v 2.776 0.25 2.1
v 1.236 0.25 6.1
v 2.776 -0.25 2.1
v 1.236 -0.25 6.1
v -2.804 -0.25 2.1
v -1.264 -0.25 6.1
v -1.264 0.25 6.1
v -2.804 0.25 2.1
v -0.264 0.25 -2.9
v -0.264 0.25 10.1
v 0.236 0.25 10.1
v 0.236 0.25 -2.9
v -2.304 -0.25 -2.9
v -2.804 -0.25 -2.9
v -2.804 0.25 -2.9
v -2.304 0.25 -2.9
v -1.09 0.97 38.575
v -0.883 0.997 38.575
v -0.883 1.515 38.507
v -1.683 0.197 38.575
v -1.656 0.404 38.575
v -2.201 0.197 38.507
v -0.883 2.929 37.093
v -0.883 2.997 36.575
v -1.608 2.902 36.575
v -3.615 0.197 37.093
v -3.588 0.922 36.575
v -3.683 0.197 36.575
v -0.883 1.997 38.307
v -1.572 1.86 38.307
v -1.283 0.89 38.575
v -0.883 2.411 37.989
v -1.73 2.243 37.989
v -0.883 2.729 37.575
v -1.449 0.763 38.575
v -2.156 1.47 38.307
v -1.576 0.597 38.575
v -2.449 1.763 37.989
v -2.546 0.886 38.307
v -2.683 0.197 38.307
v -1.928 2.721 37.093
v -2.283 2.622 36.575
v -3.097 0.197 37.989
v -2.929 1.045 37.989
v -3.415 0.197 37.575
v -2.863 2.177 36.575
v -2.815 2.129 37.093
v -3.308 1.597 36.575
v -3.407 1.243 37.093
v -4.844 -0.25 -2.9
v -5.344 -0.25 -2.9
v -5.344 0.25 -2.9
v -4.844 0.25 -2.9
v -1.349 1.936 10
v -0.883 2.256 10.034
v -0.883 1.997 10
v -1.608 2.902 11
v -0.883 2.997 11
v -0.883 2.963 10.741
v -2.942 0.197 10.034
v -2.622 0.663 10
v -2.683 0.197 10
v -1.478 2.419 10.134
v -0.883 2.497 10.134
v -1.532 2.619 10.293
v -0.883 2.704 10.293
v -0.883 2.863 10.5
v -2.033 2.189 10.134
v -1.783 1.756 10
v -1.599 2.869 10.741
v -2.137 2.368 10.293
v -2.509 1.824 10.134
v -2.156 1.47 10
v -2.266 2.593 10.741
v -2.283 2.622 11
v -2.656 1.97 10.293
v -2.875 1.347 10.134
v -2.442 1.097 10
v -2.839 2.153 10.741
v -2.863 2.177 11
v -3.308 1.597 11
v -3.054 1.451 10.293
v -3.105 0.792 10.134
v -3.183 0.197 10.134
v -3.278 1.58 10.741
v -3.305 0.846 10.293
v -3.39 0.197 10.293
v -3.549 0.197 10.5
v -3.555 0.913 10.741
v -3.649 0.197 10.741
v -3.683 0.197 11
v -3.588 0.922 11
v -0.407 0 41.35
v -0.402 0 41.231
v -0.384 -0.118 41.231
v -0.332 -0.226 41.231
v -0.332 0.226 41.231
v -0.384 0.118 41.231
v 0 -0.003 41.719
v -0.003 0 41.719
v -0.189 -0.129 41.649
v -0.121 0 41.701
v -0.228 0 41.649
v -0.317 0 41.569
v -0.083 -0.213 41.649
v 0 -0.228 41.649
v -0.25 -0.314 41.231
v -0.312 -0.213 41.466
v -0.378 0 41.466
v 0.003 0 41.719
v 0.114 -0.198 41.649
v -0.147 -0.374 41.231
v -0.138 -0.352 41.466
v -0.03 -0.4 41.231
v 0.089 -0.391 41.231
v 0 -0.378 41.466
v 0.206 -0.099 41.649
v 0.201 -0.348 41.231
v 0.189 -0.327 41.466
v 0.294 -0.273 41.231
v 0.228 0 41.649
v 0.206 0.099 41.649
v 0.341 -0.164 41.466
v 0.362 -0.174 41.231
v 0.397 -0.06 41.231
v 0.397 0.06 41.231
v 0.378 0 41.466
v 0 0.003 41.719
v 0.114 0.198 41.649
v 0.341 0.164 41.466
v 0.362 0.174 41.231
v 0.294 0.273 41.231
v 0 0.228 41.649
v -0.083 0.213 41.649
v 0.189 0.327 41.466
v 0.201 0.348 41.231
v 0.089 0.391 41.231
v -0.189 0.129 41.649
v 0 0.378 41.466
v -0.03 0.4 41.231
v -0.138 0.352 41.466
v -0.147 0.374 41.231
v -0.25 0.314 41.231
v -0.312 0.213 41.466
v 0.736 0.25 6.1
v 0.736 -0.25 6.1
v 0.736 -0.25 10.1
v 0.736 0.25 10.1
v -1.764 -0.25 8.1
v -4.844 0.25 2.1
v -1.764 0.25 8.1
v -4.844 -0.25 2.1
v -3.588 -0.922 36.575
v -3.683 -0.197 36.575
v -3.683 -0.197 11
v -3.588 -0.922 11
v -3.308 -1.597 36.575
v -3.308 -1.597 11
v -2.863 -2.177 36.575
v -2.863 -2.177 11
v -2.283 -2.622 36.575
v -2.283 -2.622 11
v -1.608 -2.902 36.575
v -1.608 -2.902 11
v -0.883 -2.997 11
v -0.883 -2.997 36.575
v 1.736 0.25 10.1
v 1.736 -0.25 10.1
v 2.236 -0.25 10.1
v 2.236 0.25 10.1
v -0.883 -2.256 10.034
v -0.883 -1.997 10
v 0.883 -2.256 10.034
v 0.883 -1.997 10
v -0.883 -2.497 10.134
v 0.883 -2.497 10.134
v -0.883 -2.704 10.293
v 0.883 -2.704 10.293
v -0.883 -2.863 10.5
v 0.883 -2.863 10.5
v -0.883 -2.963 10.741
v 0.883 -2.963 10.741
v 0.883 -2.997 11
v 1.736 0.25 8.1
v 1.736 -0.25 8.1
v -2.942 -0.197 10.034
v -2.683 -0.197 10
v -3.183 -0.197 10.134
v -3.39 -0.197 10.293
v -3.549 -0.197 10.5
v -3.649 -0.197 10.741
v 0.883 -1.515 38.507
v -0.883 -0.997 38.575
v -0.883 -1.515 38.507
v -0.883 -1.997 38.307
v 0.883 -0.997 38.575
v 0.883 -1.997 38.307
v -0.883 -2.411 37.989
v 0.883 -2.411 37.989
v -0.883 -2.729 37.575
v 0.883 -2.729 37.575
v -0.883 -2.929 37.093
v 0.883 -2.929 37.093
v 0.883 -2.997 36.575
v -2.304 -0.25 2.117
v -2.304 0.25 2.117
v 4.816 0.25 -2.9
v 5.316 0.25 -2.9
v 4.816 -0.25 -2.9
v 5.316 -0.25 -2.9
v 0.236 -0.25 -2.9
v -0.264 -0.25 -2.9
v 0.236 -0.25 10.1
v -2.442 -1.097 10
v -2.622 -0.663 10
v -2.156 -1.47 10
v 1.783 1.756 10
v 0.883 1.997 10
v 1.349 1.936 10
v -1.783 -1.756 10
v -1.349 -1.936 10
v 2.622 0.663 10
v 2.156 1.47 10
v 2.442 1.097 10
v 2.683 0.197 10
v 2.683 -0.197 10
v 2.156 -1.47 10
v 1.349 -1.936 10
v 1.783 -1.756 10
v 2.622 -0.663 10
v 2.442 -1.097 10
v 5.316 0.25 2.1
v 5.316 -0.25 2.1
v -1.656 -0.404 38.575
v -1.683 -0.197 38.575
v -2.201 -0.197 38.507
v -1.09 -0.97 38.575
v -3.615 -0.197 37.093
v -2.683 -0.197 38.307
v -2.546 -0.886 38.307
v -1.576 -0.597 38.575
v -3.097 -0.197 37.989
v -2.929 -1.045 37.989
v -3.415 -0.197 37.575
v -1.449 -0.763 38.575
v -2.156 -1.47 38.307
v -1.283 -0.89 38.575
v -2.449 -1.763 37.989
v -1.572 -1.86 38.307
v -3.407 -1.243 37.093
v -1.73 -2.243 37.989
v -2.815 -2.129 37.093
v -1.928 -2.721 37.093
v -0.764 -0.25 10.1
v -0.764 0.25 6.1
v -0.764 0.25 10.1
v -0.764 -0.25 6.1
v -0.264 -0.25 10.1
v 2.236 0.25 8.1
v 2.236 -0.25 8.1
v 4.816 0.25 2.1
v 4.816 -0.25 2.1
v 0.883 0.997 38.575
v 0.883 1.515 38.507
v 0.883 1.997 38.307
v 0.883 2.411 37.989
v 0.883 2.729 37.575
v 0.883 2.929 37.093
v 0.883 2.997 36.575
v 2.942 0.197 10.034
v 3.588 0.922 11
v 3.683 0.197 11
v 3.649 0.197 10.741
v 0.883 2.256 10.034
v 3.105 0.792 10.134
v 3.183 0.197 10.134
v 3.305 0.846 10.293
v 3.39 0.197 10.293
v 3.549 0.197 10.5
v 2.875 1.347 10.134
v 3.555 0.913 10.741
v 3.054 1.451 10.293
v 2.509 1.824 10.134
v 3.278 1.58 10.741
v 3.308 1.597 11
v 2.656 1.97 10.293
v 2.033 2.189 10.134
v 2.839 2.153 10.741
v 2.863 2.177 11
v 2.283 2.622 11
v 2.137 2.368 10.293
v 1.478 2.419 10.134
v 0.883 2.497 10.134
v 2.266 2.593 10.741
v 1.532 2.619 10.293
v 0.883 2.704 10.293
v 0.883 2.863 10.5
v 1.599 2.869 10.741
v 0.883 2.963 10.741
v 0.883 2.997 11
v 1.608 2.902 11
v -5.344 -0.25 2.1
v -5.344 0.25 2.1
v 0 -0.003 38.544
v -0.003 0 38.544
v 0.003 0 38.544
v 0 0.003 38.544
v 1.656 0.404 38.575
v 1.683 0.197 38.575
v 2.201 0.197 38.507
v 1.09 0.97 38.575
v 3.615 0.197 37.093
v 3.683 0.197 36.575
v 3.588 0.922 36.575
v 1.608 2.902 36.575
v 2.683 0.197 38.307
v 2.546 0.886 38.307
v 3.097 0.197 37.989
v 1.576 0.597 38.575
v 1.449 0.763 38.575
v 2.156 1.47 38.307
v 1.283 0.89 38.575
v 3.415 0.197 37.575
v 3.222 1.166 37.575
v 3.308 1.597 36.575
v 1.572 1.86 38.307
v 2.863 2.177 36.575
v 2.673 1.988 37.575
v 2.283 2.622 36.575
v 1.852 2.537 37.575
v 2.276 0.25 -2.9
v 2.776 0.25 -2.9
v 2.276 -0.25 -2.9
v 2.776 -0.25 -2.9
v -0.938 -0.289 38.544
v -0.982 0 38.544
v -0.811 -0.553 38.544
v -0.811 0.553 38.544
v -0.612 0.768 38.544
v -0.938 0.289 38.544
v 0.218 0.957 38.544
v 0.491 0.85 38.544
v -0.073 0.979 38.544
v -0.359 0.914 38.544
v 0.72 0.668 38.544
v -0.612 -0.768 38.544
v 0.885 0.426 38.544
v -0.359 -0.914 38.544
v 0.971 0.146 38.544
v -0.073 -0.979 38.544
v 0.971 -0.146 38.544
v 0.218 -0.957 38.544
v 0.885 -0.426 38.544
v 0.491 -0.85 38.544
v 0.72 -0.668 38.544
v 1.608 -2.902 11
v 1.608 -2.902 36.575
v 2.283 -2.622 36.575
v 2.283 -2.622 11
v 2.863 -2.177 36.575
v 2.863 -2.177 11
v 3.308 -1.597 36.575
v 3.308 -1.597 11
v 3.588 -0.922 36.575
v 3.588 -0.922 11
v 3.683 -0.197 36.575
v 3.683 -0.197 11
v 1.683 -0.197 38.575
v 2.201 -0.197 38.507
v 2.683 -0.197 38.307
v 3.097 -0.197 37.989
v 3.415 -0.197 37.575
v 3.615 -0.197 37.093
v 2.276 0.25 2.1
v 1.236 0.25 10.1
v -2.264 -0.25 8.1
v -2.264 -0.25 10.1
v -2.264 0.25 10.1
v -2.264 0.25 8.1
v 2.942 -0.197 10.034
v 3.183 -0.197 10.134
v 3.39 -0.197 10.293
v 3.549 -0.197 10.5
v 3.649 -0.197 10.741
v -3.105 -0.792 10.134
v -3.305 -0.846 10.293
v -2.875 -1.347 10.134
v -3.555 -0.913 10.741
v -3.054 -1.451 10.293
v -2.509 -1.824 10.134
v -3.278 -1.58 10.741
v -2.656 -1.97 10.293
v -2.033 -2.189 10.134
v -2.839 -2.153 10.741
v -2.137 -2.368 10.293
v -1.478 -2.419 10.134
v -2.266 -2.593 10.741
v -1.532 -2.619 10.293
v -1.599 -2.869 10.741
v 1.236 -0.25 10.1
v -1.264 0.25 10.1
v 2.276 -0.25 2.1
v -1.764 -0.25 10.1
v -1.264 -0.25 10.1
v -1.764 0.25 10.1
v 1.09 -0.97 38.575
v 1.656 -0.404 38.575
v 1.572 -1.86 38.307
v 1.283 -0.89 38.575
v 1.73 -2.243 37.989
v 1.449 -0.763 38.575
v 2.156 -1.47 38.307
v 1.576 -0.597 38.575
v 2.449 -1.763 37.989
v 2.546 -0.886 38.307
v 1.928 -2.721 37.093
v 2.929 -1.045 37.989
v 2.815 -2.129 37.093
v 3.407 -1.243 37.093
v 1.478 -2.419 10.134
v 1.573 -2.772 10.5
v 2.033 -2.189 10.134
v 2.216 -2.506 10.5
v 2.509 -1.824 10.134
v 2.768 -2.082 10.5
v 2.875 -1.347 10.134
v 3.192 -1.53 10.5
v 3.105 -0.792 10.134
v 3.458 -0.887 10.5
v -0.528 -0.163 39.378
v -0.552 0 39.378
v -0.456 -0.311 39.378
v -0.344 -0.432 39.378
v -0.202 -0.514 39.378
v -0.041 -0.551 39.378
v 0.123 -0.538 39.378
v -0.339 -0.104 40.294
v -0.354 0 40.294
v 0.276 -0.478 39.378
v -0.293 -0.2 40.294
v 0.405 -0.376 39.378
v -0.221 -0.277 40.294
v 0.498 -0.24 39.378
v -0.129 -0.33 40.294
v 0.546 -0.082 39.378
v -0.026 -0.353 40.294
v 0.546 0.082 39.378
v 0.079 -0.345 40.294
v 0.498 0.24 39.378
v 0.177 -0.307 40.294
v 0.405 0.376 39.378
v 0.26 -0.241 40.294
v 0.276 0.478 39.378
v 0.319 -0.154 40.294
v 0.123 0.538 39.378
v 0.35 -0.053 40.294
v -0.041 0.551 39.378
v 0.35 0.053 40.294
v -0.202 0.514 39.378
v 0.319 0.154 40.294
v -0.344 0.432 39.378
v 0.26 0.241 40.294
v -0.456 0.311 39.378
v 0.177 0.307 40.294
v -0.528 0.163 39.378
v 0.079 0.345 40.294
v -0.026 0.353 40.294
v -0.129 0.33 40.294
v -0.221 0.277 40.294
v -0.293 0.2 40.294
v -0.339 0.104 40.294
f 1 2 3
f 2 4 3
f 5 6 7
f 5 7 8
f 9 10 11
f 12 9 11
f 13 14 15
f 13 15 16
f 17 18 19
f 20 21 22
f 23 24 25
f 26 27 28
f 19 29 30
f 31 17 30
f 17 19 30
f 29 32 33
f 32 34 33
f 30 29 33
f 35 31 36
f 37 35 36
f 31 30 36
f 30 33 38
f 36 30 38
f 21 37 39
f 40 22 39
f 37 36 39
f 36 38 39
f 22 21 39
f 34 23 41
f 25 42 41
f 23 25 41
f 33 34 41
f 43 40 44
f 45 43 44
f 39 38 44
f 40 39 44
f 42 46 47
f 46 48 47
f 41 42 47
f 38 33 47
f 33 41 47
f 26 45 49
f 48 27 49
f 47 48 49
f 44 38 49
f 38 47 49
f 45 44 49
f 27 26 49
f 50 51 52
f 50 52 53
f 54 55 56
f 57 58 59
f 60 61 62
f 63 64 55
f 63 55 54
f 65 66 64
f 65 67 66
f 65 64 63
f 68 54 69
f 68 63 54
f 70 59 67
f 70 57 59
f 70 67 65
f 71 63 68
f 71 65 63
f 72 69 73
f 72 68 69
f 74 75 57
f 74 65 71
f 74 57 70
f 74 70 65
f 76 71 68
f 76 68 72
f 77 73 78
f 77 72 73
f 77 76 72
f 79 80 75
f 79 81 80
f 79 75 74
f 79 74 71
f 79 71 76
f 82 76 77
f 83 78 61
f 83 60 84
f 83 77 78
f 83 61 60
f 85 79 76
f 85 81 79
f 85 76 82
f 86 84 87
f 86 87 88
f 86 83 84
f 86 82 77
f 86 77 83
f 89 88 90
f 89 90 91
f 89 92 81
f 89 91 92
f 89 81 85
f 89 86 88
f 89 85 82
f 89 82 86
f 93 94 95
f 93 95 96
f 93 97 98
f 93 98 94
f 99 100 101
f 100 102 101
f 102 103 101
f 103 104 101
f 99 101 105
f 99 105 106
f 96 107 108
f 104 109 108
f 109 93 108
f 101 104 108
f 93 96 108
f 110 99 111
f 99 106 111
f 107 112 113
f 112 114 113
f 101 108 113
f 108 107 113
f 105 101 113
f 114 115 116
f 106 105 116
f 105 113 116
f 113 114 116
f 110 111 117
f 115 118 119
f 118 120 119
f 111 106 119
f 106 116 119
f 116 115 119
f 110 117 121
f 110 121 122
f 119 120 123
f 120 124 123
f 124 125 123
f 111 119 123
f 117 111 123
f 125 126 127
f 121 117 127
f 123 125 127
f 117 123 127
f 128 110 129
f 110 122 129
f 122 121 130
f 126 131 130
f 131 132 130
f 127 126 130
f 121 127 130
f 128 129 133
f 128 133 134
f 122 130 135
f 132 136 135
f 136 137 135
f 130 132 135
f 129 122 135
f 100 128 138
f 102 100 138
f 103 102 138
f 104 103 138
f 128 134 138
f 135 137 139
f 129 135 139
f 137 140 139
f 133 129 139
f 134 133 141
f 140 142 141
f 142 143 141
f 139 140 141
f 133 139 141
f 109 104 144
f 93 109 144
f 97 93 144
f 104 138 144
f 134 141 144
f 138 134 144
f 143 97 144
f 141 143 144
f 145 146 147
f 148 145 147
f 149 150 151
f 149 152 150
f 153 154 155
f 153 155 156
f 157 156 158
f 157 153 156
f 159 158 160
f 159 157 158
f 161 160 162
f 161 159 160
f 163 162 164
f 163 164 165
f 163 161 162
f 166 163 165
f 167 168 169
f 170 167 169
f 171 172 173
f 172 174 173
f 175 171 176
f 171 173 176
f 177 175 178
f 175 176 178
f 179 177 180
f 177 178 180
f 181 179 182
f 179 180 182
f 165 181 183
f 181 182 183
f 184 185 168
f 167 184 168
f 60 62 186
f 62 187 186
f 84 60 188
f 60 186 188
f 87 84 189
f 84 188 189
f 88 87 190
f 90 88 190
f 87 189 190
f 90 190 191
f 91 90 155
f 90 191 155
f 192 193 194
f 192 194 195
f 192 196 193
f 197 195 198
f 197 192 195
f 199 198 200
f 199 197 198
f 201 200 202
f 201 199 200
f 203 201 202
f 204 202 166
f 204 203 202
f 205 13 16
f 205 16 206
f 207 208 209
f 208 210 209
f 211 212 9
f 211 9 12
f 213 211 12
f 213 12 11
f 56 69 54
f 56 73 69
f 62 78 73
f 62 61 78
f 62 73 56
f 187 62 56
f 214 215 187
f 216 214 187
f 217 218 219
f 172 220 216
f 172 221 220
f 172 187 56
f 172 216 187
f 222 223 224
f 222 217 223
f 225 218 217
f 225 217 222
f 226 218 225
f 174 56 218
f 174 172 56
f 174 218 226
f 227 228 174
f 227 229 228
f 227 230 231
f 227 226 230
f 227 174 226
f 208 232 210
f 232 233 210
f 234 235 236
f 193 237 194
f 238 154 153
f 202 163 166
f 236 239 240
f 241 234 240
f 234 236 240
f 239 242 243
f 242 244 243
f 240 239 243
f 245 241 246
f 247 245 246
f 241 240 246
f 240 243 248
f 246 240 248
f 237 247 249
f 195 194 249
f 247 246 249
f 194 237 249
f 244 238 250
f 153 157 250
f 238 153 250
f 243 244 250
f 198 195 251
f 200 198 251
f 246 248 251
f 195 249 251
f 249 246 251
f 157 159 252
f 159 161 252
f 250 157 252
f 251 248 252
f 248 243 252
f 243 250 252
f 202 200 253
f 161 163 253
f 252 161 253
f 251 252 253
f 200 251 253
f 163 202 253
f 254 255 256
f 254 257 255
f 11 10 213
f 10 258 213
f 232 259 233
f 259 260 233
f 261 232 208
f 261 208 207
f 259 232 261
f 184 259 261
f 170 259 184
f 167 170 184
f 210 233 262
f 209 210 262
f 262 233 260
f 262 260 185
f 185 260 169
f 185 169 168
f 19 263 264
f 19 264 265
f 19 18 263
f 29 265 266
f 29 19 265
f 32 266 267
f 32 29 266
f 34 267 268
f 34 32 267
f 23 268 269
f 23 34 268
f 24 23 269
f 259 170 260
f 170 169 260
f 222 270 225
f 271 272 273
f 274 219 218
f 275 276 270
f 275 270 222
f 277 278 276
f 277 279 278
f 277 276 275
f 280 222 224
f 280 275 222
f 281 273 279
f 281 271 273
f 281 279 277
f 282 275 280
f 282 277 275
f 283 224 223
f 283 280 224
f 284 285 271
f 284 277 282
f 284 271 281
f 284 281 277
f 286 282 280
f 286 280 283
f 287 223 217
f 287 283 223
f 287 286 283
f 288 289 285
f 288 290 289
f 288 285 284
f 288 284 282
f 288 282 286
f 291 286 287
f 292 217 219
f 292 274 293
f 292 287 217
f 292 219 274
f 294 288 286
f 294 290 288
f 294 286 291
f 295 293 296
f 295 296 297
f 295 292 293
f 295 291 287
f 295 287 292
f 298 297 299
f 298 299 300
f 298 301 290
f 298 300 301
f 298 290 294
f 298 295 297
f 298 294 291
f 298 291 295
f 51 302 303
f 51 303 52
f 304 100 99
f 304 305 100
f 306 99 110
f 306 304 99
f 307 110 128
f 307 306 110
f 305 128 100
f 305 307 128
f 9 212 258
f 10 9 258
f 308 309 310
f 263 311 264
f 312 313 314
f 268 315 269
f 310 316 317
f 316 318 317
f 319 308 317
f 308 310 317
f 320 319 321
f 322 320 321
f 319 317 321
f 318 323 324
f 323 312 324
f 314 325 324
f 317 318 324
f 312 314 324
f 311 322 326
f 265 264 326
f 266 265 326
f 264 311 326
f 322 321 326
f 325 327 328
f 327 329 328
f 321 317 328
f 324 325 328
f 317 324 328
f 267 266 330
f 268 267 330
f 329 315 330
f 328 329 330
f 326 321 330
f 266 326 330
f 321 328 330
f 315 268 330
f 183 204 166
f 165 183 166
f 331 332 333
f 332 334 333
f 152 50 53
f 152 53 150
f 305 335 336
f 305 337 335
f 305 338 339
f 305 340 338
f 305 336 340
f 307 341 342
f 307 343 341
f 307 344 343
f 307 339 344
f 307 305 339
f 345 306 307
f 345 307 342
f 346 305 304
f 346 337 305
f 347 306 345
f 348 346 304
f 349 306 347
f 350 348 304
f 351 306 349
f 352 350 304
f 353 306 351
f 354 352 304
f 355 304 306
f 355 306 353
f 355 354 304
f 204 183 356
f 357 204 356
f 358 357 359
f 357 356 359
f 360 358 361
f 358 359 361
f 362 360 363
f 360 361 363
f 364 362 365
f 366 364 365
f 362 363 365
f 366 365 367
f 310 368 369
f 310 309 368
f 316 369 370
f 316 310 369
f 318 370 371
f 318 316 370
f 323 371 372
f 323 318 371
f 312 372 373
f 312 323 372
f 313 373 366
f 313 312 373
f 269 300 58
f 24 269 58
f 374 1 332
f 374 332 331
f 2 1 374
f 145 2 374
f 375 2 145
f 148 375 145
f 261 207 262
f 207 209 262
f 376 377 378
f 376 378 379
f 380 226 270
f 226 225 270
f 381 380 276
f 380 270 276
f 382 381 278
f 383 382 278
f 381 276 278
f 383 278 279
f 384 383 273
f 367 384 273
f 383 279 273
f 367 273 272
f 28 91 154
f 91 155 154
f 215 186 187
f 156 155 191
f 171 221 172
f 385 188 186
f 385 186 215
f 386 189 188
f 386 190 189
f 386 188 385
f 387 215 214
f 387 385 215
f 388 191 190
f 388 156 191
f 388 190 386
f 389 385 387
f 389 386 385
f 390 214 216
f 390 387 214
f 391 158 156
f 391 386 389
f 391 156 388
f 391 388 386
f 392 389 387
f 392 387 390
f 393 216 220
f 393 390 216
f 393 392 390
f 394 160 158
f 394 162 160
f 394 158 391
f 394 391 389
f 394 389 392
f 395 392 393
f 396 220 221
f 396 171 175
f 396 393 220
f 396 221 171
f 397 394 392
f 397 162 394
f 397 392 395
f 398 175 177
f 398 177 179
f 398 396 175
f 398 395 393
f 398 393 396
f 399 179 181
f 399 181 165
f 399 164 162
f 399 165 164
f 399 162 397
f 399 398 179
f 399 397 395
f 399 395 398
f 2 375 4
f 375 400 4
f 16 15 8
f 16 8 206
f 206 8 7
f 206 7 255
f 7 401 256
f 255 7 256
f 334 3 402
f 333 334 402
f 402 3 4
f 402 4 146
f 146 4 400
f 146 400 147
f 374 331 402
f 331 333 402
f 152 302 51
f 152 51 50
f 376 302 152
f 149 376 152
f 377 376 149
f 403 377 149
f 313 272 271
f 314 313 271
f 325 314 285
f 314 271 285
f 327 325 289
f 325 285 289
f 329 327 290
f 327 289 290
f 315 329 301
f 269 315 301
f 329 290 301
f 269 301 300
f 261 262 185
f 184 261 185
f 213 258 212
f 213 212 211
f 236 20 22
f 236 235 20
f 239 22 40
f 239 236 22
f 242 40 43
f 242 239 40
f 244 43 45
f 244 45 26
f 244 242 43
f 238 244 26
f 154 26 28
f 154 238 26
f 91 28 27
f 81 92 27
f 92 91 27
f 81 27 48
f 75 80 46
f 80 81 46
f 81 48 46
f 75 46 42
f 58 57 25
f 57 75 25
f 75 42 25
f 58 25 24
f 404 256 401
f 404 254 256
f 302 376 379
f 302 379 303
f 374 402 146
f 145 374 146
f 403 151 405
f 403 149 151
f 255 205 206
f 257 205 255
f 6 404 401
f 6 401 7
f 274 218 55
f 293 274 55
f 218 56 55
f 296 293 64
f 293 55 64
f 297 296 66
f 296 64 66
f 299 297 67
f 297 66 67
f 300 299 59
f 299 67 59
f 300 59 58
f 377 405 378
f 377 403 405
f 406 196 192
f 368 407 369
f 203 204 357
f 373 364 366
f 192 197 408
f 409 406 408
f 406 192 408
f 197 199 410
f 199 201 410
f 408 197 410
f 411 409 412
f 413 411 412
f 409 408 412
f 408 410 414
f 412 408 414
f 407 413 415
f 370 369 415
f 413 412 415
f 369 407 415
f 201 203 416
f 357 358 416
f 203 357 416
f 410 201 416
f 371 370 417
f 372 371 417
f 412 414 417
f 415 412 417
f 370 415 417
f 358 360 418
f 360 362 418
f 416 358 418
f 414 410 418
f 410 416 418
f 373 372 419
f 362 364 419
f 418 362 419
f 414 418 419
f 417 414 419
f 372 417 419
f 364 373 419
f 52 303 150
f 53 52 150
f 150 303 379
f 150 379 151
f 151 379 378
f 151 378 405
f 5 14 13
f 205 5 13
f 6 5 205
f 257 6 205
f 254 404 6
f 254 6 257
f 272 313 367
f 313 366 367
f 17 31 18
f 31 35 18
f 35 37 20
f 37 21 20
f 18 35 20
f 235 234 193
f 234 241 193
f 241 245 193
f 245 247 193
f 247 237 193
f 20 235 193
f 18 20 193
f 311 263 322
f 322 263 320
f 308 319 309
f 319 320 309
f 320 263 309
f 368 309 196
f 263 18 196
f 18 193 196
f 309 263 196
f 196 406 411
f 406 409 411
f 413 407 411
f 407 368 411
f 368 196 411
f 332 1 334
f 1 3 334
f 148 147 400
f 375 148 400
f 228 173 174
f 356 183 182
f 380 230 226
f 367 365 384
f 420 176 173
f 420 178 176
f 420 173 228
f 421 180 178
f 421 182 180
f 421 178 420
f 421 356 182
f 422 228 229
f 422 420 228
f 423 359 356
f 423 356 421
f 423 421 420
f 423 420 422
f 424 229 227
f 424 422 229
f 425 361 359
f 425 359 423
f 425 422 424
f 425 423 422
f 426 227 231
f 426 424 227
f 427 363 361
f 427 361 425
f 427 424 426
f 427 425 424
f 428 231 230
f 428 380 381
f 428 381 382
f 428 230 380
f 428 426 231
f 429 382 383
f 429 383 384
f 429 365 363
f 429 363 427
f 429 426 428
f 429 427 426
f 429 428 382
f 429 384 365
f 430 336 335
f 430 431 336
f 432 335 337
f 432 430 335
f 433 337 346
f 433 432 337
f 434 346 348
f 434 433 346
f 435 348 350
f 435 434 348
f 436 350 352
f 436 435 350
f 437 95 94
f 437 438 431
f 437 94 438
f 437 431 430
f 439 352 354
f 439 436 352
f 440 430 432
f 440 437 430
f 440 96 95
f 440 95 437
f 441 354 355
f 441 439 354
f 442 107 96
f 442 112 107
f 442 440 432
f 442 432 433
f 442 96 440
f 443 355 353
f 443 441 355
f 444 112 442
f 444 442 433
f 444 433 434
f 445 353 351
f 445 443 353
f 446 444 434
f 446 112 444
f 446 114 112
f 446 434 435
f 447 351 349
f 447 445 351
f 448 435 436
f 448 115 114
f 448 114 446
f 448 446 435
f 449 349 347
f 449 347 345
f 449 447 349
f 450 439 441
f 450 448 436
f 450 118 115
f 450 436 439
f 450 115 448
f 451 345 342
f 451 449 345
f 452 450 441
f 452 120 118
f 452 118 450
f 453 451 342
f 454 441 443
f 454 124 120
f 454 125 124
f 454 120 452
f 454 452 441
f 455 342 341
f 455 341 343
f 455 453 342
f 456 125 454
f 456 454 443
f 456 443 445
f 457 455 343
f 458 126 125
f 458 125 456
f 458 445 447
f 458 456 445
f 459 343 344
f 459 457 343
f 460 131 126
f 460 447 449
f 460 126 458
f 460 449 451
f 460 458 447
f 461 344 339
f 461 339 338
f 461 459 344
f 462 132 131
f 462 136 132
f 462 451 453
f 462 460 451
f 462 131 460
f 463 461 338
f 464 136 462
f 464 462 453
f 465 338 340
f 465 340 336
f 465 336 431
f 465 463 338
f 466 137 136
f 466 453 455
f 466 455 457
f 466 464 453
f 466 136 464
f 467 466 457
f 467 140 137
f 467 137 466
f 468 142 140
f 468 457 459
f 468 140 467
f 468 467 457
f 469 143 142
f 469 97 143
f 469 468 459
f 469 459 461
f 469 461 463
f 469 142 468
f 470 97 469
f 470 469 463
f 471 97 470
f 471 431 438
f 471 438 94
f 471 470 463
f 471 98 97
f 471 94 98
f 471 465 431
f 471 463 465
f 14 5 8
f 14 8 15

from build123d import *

# Parameters (mm, degrees)
PAD_DEPTH    = 2.9972
FILLET_R     = 2.8
FILLET001_R  = 2
FILLET002_R  = 1
PAD001_DEPTH = 0.25
PAD002_DEPTH = 0.25
SKETCH004_W  = 0.5
SKETCH004_H  = 13
PAD003_DEPTH = 0.25
PAD004_DEPTH = 0.25
PAD005_DEPTH = 0.25


with BuildPart() as fillet002:
    # Sketch → Pad (new body, symmetric)
    with BuildSketch(Plane.XZ):
        Polygon((-3.683, 10), (-3.683, 38.575), (3.683, 38.575), (3.683, 10), (0, 10), align=None)
    extrude(amount=PAD_DEPTH, both=True)

    # Fillet
    fillet_edges = [fillet002.edges().sort_by_distance(p)[0] for p in [
        (3.683, -2.9972, 24.2875),
        (3.683, 2.9972, 24.2875),
        (-3.683, -2.9972, 24.2875),
        (-3.683, 2.9972, 24.2875),
    ]]
    fillet(fillet_edges, radius=FILLET_R)

    # Fillet001
    fillet001_edges = [fillet002.edges().sort_by_distance(p)[0] for p in [
        (2.862899, 2.177099, 38.575),
        (0, 2.9972, 38.575),
        (-2.862899, 2.177099, 38.575),
        (-2.862899, -2.177099, 38.575),
        (0, -2.9972, 38.575),
        (2.862899, -2.177099, 38.575),
        (3.683, 0, 38.575),
        (-3.683, 0, 38.575),
    ]]
    fillet(fillet001_edges, radius=FILLET001_R)

    # Fillet002
    fillet002_edges = [fillet002.edges().sort_by_distance(p)[0] for p in [
        (2.862899, -2.177099, 10),
        (3.683, 0, 10),
        (2.862899, 2.177099, 10),
        (-0.4415, 2.9972, 10),
        (0.4415, 2.9972, 10),
        (0.4415, -2.9972, 10),
        (-0.4415, -2.9972, 10),
        (-2.862899, -2.177099, 10),
        (-3.683, 0, 10),
        (-2.862899, 2.177099, 10),
    ]]
    fillet(fillet002_edges, radius=FILLET002_R)


with BuildPart() as revolution:
    # Sketch001 → Revolution (revolve)
    with BuildSketch(Plane.XZ):
        with BuildLine():
            ThreePointArc((-0.00252, 41.718762), (-0.316632, 41.568752), (-0.401567, 41.23118))
            ThreePointArc((-0.981911, 38.543762), (-0.423058, 39.82945), (-0.401567, 41.23118))
            Line((-0.00252, 38.543762), (-0.981911, 38.543762))
            Line((-0.00252, 41.718762), (-0.00252, 38.543762))
        make_face()
    revolve(axis=Axis((0, 0, 0), (0, 0, 1)))


with BuildPart() as pad001:
    # Sketch002 → Pad001 (new body, symmetric)
    with BuildSketch(Plane.XZ):
        Polygon((1.736213, 10.1), (2.236213, 10.1), (2.236213, 8.1), (5.316213, 2.1), (5.316213, -2.9), (4.816213, -2.9), (4.816213, 2.1), (1.736213, 8.100001), align=None)
    extrude(amount=PAD001_DEPTH, both=True)


with BuildPart() as pad002:
    # Sketch003 → Pad002 (new body, symmetric)
    with BuildSketch(Plane.XZ):
        Polygon((0.736213, 10.1), (1.236213, 10.1), (1.236213, 6.1), (2.776213, 2.1), (2.776213, -2.9), (2.276213, -2.9), (2.276213, 2.1), (0.736213, 6.100001), align=None)
    extrude(amount=PAD002_DEPTH, both=True)


with BuildPart() as pad003:
    # Sketch004 → Pad003 (new body, symmetric)
    with BuildSketch(Plane.XZ):
        with Locations((-0.013787, 3.6)):
            Rectangle(SKETCH004_W, SKETCH004_H)
    extrude(amount=PAD003_DEPTH, both=True)


with BuildPart() as pad004:
    # Sketch005 → Pad004 (new body, symmetric)
    with BuildSketch(Plane.XZ):
        Polygon((-0.763787, 10.1), (-1.263787, 10.1), (-1.263787, 6.100001), (-2.803787, 2.1), (-2.803787, -2.9), (-2.303787, -2.9), (-2.303787, 2.117351), (-0.763787, 6.1), align=None)
    extrude(amount=PAD004_DEPTH, both=True)


with BuildPart() as pad005:
    # Sketch006 → Pad005 (new body, symmetric)
    with BuildSketch(Plane.XZ):
        Polygon((-1.763787, 10.1), (-2.263787, 10.1), (-2.263787, 8.1), (-5.343787, 2.1), (-5.343787, -2.9), (-4.843787, -2.9), (-4.843787, 2.1), (-1.763787, 8.100001), align=None)
    extrude(amount=PAD005_DEPTH, both=True)


solid = Compound([fillet002.part, revolution.part, pad001.part, pad002.part, pad003.part, pad004.part, pad005.part])
